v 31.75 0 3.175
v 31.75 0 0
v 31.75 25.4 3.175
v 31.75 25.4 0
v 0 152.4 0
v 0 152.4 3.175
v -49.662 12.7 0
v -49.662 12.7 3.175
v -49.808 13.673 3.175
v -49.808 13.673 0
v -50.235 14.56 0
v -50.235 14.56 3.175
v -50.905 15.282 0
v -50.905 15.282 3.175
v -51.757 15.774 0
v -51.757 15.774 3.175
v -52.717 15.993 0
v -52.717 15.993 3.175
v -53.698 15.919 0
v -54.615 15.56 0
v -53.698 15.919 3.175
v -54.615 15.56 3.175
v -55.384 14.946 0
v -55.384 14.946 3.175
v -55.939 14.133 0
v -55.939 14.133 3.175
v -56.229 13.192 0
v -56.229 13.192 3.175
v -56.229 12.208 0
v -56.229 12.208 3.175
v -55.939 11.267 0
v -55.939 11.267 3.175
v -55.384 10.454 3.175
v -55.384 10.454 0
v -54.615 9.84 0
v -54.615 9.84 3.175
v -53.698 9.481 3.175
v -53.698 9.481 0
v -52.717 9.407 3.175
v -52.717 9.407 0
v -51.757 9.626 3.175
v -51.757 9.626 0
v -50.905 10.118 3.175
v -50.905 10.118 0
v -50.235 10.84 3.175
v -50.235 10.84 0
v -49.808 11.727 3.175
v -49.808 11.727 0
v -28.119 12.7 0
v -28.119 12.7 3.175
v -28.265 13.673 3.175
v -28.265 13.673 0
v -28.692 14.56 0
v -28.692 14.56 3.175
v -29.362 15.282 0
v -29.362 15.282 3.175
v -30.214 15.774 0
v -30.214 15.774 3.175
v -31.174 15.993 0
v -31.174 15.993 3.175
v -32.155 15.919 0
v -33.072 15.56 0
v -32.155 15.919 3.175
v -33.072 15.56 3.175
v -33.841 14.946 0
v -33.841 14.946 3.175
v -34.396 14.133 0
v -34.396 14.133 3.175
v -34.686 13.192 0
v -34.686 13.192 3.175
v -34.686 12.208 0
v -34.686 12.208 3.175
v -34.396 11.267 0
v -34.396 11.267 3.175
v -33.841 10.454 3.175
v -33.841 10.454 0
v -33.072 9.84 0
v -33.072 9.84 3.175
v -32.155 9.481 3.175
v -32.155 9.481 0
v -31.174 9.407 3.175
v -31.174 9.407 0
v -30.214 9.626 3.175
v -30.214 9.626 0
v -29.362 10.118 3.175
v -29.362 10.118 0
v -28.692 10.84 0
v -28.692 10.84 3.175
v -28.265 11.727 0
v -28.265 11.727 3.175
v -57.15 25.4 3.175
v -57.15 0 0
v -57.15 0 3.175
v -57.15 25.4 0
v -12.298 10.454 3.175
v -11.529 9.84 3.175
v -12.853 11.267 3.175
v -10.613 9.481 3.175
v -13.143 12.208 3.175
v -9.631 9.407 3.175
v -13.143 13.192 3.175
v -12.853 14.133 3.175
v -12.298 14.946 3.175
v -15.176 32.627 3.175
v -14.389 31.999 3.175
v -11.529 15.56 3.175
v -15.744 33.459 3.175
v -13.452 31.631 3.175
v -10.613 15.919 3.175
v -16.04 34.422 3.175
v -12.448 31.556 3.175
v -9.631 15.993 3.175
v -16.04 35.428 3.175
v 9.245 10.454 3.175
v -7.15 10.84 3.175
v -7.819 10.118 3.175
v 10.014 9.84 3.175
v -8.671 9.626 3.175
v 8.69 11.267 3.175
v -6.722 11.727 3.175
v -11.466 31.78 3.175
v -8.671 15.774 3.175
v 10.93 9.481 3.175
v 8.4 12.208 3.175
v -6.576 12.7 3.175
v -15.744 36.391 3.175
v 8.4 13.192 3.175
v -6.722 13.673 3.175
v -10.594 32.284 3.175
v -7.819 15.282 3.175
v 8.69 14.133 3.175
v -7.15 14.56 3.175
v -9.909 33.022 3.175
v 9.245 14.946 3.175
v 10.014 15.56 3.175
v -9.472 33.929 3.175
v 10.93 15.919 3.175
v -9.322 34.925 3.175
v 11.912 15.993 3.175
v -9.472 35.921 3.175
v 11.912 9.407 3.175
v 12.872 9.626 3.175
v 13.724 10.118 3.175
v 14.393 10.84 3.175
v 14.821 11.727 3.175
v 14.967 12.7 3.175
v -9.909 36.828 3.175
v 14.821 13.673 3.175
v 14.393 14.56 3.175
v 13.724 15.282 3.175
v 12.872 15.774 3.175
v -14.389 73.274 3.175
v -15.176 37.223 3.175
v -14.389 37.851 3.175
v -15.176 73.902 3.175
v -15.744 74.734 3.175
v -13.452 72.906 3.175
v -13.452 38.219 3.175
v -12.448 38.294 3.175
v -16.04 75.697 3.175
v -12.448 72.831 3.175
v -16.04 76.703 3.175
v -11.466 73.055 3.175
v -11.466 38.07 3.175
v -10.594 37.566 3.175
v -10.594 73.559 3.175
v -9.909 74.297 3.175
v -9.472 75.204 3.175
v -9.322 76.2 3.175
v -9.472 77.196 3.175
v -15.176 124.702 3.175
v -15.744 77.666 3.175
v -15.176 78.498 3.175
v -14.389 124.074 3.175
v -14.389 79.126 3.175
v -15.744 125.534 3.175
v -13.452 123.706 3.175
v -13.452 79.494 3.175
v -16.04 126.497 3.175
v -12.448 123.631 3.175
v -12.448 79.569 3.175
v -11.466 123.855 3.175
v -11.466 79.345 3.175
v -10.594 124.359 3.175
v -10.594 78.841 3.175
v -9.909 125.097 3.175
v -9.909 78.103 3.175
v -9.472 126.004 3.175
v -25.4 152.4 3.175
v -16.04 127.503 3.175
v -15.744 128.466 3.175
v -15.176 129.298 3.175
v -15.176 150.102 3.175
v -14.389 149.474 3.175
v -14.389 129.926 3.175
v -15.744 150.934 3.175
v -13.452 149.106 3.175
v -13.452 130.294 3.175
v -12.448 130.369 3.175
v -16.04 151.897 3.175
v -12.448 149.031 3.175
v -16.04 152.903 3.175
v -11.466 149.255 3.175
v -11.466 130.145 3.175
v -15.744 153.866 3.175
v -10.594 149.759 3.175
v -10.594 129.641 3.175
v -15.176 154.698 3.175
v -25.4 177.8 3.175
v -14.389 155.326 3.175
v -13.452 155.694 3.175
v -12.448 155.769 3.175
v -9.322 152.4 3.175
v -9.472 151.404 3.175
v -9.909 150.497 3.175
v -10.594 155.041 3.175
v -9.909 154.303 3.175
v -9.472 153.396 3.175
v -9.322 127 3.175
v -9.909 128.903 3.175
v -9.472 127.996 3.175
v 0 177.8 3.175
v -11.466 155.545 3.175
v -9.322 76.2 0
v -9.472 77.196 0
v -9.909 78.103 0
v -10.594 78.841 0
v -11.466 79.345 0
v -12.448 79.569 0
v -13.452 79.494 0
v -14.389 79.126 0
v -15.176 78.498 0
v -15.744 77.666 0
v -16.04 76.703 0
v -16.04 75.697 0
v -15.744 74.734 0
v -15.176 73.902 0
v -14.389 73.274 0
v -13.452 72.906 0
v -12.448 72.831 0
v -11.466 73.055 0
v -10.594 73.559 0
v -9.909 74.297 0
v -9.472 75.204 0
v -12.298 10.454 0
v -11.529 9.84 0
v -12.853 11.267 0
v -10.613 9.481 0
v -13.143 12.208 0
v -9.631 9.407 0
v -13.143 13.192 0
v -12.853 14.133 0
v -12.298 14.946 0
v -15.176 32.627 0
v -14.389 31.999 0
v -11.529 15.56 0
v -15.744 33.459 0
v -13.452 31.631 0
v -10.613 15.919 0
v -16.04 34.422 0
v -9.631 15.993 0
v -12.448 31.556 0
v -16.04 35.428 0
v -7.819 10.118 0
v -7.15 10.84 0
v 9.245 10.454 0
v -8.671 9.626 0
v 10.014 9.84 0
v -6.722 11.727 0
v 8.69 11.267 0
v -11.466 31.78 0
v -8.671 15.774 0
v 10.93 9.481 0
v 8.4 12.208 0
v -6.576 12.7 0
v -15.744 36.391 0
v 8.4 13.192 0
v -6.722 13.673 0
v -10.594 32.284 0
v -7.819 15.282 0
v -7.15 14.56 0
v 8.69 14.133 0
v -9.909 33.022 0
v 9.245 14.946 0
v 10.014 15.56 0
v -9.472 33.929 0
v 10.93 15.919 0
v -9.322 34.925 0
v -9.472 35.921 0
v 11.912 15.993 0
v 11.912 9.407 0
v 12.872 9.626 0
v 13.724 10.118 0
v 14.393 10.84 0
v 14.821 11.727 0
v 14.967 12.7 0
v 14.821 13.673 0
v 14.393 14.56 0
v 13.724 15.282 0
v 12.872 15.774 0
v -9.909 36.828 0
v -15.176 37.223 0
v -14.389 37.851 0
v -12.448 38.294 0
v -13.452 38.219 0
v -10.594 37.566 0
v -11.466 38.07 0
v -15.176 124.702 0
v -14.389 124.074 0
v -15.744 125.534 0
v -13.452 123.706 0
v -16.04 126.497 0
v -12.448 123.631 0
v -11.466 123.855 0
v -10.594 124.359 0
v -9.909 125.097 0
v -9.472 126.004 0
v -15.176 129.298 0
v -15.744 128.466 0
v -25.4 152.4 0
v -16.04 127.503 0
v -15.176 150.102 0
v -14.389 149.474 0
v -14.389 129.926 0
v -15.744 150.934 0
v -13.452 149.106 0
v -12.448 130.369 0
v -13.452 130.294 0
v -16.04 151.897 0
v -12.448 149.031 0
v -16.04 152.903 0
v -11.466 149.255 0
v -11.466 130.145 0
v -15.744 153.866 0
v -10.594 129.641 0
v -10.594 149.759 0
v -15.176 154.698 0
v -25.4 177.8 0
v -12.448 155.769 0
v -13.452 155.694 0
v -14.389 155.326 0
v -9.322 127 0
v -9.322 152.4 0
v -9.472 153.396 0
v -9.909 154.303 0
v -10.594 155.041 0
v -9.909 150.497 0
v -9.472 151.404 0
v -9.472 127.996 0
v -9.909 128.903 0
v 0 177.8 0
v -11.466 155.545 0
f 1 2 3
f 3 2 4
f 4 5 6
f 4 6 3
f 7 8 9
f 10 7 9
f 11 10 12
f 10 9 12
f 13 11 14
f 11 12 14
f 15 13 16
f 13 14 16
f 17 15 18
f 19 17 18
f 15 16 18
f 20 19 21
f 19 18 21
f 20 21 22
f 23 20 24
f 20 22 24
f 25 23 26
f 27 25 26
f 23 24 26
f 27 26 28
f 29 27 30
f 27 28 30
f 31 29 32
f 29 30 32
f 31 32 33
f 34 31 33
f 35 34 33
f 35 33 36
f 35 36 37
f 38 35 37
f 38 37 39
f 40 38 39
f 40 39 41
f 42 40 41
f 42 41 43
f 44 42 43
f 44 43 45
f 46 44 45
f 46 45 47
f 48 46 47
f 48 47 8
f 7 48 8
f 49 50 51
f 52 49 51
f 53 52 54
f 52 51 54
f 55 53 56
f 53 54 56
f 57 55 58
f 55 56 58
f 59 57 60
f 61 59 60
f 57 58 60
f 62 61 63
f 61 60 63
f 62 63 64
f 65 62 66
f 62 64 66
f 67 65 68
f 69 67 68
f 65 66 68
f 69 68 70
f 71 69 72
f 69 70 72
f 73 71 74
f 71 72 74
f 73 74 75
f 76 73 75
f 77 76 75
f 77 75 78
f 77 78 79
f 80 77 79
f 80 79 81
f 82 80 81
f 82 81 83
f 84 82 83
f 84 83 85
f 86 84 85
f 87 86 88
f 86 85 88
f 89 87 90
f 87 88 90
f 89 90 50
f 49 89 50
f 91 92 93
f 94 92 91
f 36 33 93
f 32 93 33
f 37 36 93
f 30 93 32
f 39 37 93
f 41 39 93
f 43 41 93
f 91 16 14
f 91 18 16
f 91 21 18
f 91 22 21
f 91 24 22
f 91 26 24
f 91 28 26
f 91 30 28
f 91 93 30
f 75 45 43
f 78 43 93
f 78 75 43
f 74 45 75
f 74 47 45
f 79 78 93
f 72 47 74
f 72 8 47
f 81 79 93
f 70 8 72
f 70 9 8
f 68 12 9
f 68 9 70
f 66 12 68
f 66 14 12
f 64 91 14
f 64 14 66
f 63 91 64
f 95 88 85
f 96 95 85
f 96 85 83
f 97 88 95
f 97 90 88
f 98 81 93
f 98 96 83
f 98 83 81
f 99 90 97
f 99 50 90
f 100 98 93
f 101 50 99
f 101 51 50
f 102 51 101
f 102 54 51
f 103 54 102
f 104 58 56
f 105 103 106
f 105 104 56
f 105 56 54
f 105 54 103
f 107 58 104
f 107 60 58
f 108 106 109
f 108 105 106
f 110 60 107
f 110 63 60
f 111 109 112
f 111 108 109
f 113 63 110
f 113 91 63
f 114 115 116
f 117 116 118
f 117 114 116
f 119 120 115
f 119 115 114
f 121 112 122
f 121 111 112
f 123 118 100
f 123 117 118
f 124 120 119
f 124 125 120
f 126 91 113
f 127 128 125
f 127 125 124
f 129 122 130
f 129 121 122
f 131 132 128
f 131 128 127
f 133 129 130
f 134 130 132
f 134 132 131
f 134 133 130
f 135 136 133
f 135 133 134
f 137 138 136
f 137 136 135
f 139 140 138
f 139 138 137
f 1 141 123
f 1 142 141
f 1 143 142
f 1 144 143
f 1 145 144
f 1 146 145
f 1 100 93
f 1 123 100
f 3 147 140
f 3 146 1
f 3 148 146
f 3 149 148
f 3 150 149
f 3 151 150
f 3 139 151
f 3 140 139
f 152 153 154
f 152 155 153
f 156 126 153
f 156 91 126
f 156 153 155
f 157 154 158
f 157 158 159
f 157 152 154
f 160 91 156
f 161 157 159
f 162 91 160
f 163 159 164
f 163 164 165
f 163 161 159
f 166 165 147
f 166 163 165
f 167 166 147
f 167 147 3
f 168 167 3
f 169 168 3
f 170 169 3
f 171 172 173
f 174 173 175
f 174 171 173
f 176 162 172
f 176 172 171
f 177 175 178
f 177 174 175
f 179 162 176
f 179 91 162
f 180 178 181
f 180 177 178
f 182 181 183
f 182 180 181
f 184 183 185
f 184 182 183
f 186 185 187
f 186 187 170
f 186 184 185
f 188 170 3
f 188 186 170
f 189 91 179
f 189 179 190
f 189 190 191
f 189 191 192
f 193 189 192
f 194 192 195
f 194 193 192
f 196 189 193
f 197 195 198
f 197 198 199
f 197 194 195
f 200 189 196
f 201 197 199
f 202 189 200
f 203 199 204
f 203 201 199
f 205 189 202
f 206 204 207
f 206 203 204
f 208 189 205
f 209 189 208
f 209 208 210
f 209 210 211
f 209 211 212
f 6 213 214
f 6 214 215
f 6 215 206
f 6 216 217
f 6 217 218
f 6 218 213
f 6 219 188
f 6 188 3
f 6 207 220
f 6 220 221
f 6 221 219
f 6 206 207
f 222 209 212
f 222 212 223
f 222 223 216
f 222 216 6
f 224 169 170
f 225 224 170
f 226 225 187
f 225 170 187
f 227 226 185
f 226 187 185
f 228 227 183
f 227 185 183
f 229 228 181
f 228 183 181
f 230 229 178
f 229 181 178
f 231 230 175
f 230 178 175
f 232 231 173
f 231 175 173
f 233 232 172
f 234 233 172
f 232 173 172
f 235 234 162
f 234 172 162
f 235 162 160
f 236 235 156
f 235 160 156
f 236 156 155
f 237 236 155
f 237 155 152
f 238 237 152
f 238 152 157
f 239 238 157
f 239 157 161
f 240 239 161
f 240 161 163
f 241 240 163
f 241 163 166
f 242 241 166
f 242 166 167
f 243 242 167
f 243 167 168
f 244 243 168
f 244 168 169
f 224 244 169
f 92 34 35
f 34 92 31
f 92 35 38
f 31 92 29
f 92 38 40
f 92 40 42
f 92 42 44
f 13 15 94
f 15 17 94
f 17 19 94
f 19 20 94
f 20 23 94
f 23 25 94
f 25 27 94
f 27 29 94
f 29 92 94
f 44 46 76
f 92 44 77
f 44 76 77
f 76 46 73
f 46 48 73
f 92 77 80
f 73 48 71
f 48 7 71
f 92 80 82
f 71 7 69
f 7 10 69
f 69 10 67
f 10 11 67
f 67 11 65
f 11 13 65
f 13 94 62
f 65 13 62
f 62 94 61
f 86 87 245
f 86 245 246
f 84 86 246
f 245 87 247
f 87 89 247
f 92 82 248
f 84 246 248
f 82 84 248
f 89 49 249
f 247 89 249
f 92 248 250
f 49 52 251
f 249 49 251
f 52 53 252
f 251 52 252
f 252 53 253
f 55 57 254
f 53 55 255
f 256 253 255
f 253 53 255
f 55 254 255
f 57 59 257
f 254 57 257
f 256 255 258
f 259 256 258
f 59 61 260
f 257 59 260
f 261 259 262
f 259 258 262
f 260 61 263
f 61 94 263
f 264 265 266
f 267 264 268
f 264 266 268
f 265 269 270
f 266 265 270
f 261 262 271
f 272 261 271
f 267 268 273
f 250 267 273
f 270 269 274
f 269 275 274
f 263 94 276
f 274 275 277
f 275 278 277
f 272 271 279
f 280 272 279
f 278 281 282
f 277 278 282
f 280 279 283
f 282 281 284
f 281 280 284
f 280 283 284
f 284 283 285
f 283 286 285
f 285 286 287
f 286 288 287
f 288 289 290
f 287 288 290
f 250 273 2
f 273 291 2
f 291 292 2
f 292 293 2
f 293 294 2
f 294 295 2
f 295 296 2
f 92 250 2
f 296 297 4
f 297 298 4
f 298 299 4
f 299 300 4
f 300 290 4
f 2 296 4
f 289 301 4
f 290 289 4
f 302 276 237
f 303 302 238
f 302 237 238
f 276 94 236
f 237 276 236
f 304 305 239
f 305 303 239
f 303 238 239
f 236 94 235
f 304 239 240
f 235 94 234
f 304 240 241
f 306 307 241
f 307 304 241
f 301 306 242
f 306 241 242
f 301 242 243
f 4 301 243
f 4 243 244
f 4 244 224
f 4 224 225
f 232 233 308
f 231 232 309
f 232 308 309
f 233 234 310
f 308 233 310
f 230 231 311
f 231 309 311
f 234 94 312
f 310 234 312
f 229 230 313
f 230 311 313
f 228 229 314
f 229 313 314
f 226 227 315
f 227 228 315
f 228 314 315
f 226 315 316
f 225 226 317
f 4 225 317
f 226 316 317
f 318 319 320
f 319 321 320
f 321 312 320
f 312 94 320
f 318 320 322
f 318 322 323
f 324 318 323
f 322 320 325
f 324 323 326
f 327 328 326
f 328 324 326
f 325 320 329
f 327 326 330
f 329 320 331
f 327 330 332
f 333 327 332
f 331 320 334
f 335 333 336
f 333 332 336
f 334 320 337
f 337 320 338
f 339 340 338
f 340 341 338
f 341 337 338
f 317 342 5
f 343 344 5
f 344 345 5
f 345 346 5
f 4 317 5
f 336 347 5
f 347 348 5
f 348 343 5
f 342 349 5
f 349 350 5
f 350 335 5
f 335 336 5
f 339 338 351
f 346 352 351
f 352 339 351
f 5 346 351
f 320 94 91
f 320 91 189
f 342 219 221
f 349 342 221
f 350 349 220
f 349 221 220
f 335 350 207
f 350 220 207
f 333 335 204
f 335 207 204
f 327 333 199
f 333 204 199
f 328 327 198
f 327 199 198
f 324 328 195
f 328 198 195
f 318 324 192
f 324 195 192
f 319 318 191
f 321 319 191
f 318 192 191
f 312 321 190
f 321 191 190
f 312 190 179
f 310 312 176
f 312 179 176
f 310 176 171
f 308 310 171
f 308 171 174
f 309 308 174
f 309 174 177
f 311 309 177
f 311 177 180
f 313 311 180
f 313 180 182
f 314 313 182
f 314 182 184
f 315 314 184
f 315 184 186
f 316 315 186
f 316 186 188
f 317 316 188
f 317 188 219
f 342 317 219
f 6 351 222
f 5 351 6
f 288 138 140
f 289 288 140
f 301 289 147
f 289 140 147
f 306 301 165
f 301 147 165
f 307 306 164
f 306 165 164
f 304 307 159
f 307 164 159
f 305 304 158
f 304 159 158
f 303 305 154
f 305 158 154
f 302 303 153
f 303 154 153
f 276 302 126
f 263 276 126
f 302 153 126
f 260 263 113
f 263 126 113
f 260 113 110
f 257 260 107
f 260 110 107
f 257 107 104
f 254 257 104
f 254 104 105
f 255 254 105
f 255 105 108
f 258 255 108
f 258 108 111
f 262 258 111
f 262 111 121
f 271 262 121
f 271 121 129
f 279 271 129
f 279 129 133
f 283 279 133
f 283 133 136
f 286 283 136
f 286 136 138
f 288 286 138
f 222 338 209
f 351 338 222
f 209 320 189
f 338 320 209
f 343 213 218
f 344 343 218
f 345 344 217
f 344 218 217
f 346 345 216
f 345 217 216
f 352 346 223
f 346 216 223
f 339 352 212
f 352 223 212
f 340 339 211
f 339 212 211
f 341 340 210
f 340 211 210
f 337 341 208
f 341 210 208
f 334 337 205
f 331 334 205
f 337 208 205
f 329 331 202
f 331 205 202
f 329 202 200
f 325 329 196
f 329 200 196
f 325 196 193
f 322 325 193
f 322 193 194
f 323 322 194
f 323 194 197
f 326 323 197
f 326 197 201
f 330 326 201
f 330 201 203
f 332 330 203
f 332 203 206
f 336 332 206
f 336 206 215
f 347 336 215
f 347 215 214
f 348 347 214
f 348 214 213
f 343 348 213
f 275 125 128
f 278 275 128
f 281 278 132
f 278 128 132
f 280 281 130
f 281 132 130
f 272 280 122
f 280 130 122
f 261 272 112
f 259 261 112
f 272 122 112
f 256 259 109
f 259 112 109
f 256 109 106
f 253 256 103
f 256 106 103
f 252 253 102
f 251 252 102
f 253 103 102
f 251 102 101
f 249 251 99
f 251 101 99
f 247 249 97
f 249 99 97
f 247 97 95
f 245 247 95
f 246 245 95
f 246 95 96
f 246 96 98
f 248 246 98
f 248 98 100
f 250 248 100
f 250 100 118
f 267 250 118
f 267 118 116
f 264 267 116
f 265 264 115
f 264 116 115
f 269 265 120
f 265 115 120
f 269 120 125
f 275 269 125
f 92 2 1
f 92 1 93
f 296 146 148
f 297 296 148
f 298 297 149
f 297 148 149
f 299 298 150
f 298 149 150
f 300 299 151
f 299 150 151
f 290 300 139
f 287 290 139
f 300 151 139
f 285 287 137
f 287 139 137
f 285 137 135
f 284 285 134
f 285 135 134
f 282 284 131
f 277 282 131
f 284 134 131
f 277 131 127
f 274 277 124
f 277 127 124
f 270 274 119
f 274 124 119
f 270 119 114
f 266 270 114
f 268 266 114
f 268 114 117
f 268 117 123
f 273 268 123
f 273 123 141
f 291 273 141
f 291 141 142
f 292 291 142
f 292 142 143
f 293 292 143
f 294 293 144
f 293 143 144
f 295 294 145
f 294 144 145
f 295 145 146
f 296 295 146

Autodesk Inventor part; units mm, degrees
ref_plane "YZ Plane" through (0, 0, 0) normal (1, 0, 0) x (0, 1, 0)
ref_plane "XZ Plane" through (0, 0, 0) normal (0, 1, 0) x (-1, 0, 0)
ref_plane "XY Plane" through (0, 0, 0) normal (0, 0, 1) x (1, 0, 0)
sketch "Sketch1" plane through (0, 0, 0) normal (0, 0, 1) x (1, 0, 0)
  line L0 (0, 0) -> (-25.4, 0)
  line L1 (-25.4, 0) -> (-25.4, 177.8)
  line L2 (-25.4, 177.8) -> (0, 177.8)
  line L3 (0, 177.8) -> (0, 0)
  line L4 (-25.4, 0) -> (-57.15, 0)
  line L5 (0, 0) -> (31.75, 0)
  line L6 (31.75, 0) -> (31.75, 25.4)
  line L7 (31.75, 25.4) -> (0, 25.4)
  line L8 (-57.15, 0) -> (-57.15, 25.4)
  line L9 (-57.15, 25.4) -> (-25.4, 25.4)
  line L10 (31.75, 25.4) -> (28.575, 25.4)
  line L11 (-25.4, 177.8) -> (-25.4, 152.4)
  line L12 (0, 177.8) -> (0, 150.469)
  line L13 (0, 177.8) -> (0, 152.4)
  line L14 (-57.15, 25.4) -> (-25.4, 152.4)
  line L15 (0, 152.4) -> (31.75, 25.4)
  dimension "d0" = 177.8
  dimension "d3" = 25.4
  dimension "d4" = 31.75
  dimension "d5" = 31.75
  dimension "d6" = 25.4
  dimension "d7" = 3.175
  dimension "d16" = 25.4
extrude "Extrusion1" add sketch "Sketch1" along normal blind 3.175
sketch "Sketch2" plane through (0, 0, 3.175) normal (0, 0, 1) x (1, 0, 0)
  line L0 (0, 177.8) -> (-25.4, 177.8) projected
  line L1 (-57.15, 25.4) -> (-57.15, 0) projected
  line L2 (-12.7, 177.8) -> (-12.7, 152.4)
  line L3 (-12.7, 152.4) -> (-12.7, 127)
  circle A0 centre (-12.7, 152.4) radius 3.3782
  circle A1 centre (-12.7, 127) radius 3.3782
  point P0 (0, 0)
  dimension "d10" = 25.4
  dimension "d11" = 25.4
  dimension "d12" = 6.7564
  dimension "d13" = 6.7564
extrude "Extrusion2" cut sketch "Sketch2" against normal blind 25.4
sketch "Sketch4" plane through (0, 0, 3.175) normal (0, 0, 1) x (1, 0, 0)
  circle A0 centre (11.6652, 12.7) radius 3.302 projected
  circle A1 centre (-9.8778, 12.7) radius 3.302 projected
  circle A2 centre (-52.9637, 12.7) radius 3.302 projected
  line L0 (74.422, 18.3438) -> (91.6421, 18.3438) projected
  circle A3 centre (-31.4207, 12.7) radius 3.302 projected
  point P0 (0, 0)
extrude "Extrusion3" cut sketch "Sketch4" against normal blind 25.4
sketch "Sketch5" plane through (0, 0, 3.175) normal (0, 0, 1) x (1, 0, 0)
  circle A0 centre (-12.7, 127) radius 3.3782 projected
  line L0 (-57.15, 25.4) -> (-57.15, 0) projected
  line L1 (-12.7, 127) -> (-12.7, 76.2)
  circle A1 centre (-12.7, 76.2) radius 3.3782
  point P0 (0, 0)
  dimension "d22" = 50.8
  dimension "d23" = 6.7564
extrude "Extrusion4" cut sketch "Sketch5" against normal blind 25.4 contours A1
sketch "Sketch6" plane through (0, 0, 3.175) normal (0, 0, 1) x (1, 0, 0)
  circle A0 centre (-12.7, 76.2) radius 3.3782 projected
  line L0 (-57.15, 25.4) -> (-57.15, 0) projected
  line L1 (-12.7, 76.2) -> (-12.7, 34.925)
  circle A1 centre (-12.7, 34.925) radius 3.3782
  point P0 (0, 0)
  dimension "d26" = 41.275
  dimension "d27" = 6.7564
extrude "Extrusion5" cut sketch "Sketch6" against normal blind 25.4 contours A1
properties part number "winch support" material "Aluminum 6061"
